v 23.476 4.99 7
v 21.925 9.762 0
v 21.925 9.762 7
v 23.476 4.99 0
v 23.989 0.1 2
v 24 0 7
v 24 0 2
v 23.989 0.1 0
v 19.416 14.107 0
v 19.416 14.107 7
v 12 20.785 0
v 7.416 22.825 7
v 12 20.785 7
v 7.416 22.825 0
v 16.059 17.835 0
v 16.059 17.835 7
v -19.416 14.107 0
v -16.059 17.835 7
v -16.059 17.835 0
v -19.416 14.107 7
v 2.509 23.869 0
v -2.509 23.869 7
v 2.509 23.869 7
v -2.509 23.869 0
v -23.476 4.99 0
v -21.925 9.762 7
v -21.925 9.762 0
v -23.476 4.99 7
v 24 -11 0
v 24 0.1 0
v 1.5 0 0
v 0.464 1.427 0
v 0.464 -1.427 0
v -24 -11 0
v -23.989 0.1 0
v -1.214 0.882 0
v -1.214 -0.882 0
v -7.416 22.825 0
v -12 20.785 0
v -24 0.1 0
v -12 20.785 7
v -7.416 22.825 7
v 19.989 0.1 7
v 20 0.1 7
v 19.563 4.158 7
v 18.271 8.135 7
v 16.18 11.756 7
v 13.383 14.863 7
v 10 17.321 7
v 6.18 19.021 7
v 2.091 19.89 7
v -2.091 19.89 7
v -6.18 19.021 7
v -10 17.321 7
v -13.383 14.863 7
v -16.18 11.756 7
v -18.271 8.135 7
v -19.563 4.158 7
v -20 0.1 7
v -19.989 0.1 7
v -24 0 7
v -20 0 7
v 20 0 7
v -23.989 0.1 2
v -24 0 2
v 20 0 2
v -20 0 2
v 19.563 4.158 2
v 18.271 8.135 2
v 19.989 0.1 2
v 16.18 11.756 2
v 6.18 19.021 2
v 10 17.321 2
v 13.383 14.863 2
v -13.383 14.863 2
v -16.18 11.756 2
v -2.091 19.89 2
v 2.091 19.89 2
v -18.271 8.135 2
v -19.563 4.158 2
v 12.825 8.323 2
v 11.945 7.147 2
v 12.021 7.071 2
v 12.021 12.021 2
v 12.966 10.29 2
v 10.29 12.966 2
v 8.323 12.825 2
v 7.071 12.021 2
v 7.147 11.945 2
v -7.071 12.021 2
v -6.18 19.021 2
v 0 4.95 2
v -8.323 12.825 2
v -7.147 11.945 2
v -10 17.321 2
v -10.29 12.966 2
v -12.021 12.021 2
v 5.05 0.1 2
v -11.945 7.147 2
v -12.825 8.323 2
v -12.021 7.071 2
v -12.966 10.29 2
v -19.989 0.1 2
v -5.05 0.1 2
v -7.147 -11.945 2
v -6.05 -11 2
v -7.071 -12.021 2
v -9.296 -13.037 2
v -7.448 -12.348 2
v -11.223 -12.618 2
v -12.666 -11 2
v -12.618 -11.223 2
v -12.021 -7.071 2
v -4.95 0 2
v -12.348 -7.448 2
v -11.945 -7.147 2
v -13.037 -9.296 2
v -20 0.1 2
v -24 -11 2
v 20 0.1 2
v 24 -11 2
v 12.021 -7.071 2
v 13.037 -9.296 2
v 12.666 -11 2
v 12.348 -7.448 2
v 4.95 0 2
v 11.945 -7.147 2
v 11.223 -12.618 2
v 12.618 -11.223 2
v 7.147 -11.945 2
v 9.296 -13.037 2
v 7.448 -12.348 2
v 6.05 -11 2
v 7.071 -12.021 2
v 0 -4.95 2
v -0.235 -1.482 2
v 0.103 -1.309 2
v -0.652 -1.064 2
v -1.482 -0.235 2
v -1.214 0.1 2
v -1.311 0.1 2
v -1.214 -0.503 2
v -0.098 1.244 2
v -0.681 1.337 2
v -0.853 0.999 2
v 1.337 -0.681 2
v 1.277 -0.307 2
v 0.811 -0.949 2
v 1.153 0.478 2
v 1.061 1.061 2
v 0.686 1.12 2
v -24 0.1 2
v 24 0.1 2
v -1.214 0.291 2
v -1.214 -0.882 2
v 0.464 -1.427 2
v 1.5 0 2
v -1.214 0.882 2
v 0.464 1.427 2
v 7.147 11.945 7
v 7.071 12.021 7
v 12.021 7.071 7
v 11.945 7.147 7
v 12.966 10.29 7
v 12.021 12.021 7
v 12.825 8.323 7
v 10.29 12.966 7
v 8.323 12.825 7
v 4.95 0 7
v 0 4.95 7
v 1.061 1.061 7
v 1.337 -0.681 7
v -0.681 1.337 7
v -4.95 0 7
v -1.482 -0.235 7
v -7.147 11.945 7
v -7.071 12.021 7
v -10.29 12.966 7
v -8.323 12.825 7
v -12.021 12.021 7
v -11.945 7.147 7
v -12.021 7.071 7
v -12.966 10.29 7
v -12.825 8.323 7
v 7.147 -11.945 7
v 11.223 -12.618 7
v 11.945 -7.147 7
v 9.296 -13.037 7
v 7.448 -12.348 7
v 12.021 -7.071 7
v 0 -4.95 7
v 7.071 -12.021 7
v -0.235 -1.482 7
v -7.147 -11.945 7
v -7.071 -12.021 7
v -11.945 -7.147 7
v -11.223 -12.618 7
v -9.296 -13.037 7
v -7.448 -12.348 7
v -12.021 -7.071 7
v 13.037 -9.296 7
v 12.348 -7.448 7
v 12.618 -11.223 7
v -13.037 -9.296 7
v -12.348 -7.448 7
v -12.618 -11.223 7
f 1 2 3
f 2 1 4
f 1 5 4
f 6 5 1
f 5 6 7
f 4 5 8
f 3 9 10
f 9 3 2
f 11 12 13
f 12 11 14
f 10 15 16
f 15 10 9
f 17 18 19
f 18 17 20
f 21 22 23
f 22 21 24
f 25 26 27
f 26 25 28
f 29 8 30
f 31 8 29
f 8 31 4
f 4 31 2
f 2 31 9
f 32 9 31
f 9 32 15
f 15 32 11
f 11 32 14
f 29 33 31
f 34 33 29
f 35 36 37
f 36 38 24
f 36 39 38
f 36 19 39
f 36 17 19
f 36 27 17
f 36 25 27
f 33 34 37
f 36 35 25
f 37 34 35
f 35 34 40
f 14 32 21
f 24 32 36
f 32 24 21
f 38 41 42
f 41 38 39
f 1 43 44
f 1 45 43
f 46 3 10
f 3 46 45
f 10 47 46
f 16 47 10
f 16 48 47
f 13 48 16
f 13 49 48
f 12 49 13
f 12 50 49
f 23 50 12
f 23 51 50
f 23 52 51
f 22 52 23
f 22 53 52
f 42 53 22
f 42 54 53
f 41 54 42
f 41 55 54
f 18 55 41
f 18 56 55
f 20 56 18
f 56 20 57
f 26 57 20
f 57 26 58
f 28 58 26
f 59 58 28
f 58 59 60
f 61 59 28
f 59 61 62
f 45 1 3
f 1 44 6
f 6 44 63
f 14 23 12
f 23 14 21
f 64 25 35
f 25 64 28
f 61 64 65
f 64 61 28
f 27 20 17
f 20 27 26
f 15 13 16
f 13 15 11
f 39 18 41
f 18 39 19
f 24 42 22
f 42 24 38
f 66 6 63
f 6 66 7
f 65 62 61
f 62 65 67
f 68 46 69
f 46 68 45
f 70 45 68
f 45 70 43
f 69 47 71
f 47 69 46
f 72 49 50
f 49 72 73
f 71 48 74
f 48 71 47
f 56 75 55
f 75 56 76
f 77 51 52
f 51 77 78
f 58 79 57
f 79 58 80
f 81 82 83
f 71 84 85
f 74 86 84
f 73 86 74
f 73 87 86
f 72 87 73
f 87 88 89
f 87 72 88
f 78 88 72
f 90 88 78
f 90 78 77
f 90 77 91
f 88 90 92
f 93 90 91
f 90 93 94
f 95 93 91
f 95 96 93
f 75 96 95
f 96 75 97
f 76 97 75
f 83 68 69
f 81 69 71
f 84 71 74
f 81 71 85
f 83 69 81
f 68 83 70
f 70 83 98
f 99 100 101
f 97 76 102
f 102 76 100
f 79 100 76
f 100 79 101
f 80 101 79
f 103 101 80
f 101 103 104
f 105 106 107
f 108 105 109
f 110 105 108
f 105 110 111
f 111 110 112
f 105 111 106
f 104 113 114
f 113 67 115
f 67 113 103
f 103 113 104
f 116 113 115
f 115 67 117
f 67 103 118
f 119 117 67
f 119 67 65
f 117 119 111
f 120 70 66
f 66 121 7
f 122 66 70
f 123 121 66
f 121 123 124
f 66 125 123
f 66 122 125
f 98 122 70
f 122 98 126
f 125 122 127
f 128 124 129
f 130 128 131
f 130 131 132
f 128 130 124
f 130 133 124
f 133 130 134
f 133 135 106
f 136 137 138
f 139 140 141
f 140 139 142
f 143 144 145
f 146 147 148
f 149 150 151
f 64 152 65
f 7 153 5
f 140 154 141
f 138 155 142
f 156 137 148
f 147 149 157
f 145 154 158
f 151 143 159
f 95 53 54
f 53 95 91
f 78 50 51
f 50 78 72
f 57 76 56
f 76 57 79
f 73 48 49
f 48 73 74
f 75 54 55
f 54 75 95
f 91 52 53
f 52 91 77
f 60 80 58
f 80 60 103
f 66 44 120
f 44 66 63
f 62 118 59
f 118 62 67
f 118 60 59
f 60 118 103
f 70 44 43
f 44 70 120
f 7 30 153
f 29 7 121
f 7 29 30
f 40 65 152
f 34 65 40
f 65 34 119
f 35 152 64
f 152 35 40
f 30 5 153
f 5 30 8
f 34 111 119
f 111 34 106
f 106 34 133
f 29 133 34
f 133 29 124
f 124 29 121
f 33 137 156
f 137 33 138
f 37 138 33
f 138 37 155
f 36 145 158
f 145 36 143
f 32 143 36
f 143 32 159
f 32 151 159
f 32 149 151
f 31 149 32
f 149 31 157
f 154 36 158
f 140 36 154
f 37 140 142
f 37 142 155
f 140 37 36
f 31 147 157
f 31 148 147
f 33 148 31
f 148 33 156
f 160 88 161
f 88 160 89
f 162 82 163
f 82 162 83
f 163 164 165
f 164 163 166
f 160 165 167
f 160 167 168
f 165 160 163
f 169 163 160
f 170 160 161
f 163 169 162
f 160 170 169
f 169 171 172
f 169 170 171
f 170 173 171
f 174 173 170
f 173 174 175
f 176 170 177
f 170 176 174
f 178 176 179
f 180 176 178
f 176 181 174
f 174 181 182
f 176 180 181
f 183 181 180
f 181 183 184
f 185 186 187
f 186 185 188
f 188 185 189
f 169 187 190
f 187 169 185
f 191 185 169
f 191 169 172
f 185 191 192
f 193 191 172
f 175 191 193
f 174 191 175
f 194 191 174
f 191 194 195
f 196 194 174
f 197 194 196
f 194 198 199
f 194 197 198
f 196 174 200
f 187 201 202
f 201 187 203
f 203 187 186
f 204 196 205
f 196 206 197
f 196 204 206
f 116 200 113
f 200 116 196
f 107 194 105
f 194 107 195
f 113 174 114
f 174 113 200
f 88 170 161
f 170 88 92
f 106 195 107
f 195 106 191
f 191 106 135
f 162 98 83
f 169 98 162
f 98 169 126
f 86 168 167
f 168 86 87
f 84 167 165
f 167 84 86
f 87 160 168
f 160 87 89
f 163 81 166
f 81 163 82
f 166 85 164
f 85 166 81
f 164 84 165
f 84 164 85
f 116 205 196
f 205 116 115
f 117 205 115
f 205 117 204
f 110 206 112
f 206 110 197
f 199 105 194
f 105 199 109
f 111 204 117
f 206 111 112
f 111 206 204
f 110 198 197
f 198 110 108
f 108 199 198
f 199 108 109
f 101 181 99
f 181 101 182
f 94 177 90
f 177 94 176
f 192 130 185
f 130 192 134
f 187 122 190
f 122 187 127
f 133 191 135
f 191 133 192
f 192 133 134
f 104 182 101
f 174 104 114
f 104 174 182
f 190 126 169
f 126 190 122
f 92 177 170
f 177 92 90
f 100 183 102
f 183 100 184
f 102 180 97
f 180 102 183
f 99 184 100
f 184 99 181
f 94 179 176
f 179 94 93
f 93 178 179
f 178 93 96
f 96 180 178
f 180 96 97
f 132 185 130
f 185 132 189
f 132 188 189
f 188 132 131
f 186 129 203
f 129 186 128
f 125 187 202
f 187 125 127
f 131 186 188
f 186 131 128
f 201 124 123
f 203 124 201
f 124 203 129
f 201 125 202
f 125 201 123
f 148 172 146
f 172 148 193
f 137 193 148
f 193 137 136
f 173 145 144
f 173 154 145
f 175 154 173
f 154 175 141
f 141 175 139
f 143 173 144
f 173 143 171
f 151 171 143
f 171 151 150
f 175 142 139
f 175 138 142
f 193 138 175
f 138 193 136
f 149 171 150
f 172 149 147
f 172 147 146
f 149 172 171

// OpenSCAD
// file: parameters.scad
/**
 * These are all of the shared variables that
 * are needed for the pump.
 *
 * Created 2015-08-18 by Ethan Smith
 */

/**
 * Outside diameter for the hose/tubing
 */
HoseOD = 5;

/**
 * Size to which the hose should be compressed to
 */
HoseCompressedThickness = 3;

/**
 * The basic wall thickness to abide by
 */
WallThickness = 2;

/**
 * The distance from center to center of
 * where the tubing will reside
 */
PumpDiameter = 35;

/**
 * Thickness for the bottom of the outer shell
 */
ShellBaseThickness = 2;

/**
 * Height for the lip supporting the hose
 */
ShellLipHeight = HoseOD;

/**
 * Thickness for the back wall for the outer shell
 */
ShellLipThickness = 4;

/**
 * Length for the base support tab
 */
OuterHeight = PumpDiameter;

/**
 * Diameter for the axel
 */
AxelDiameter = 3;


/*------------------------
 * RENDERING
 *----------------------*/

/**
 * This helps prevent non-maniford meshes
 */
Overlap = 0.1;


/*------------------------
 * CALCULATED
 *----------------------*/

/**
 * Distance for the outer shell of the pump
 *
 * Sizing:
 * | WALL | 1/2 of HOSE |  PumpDiameter | 1/2 of HOSE | WALL |
 */
OuterHoseEdge = PumpDiameter + HoseOD;
OuterWidth = OuterHoseEdge + (ShellLipThickness * 2);

/**
 * Entire height for the outer shell
 */
ShellTotalThickness = ShellBaseThickness + ShellLipHeight;

/**
 * The total length for the propeller
 */
PropellerLength = OuterHoseEdge - HoseCompressedThickness * 2;

/**
 * The width for the propeller
 */
PropellerWidth = AxelDiameter + ShellBaseThickness * 2;

/**
 * The thickness for the propeller
 */
PropellerThickness = ShellLipHeight;
// file: elements/propeller.scad
include <../parameters.scad>;

module propeller() {
   difference() {
      union() {
         armSet();
         rotate([0,0,90]) armSet();
      }
      translate([0, 0, -Overlap]) cylinder(PropellerThickness + (Overlap * 2), AxelDiameter/2, AxelDiameter/2);
   }
}

module armSet() {
   assign(length = PropellerLength - PropellerWidth) {
      translate([-length/2, -PropellerWidth/2]) cube([length, PropellerWidth, PropellerThickness]);

      translate([length/2, 0]) cylinder(PropellerThickness, PropellerWidth/2, PropellerWidth/2);
      translate([-length/2, 0]) cylinder(PropellerThickness, PropellerWidth/2, PropellerWidth/2);
   }
}
// file: elements/outer_shell.scad
include <../parameters.scad>;

module outer_shell() {
   difference() {
      shellAssembly();
      translate([0, 0, -Overlap]) cylinder(ShellBaseThickness + (Overlap * 2), AxelDiameter/2, AxelDiameter/2);
   }
}

module shellAssembly() {
   difference() {
      HalfCylinder(OuterWidth, ShellTotalThickness);
      translate([0, 0, ShellBaseThickness]) coreShape(OuterHoseEdge, OuterHeight, ShellLipHeight + Overlap);
   }
   assign(size = OuterHeight - (OuterWidth / 2)) translate([-OuterWidth / 2, - size]) cube([OuterWidth, size +  Overlap, ShellBaseThickness]);
}

module coreShape(width, height, thickness) {
   HalfCylinder(width, thickness);
   assign(size = height - (width / 2)) translate([-width / 2, - size]) cube([width, size +  Overlap, thickness]);
}

module HalfCylinder(size, thickness) {
   assign(halfWidth = size / 2)
   difference() {
      cylinder(thickness, size/2, size/2);
      assign(outerHalfWidth = halfWidth + Overlap) translate([-outerHalfWidth, -outerHalfWidth, -Overlap]) cube([
         outerHalfWidth * 2,
         outerHalfWidth,
         ShellTotalThickness + (Overlap * 2)
      ]);
   }
}
// main file
use <elements/outer_shell.scad>;
use <elements/propeller.scad>;
include <parameters.scad>;

outer_shell();
translate([0, 0, ShellBaseThickness]) rotate([0,0,45]) propeller();
